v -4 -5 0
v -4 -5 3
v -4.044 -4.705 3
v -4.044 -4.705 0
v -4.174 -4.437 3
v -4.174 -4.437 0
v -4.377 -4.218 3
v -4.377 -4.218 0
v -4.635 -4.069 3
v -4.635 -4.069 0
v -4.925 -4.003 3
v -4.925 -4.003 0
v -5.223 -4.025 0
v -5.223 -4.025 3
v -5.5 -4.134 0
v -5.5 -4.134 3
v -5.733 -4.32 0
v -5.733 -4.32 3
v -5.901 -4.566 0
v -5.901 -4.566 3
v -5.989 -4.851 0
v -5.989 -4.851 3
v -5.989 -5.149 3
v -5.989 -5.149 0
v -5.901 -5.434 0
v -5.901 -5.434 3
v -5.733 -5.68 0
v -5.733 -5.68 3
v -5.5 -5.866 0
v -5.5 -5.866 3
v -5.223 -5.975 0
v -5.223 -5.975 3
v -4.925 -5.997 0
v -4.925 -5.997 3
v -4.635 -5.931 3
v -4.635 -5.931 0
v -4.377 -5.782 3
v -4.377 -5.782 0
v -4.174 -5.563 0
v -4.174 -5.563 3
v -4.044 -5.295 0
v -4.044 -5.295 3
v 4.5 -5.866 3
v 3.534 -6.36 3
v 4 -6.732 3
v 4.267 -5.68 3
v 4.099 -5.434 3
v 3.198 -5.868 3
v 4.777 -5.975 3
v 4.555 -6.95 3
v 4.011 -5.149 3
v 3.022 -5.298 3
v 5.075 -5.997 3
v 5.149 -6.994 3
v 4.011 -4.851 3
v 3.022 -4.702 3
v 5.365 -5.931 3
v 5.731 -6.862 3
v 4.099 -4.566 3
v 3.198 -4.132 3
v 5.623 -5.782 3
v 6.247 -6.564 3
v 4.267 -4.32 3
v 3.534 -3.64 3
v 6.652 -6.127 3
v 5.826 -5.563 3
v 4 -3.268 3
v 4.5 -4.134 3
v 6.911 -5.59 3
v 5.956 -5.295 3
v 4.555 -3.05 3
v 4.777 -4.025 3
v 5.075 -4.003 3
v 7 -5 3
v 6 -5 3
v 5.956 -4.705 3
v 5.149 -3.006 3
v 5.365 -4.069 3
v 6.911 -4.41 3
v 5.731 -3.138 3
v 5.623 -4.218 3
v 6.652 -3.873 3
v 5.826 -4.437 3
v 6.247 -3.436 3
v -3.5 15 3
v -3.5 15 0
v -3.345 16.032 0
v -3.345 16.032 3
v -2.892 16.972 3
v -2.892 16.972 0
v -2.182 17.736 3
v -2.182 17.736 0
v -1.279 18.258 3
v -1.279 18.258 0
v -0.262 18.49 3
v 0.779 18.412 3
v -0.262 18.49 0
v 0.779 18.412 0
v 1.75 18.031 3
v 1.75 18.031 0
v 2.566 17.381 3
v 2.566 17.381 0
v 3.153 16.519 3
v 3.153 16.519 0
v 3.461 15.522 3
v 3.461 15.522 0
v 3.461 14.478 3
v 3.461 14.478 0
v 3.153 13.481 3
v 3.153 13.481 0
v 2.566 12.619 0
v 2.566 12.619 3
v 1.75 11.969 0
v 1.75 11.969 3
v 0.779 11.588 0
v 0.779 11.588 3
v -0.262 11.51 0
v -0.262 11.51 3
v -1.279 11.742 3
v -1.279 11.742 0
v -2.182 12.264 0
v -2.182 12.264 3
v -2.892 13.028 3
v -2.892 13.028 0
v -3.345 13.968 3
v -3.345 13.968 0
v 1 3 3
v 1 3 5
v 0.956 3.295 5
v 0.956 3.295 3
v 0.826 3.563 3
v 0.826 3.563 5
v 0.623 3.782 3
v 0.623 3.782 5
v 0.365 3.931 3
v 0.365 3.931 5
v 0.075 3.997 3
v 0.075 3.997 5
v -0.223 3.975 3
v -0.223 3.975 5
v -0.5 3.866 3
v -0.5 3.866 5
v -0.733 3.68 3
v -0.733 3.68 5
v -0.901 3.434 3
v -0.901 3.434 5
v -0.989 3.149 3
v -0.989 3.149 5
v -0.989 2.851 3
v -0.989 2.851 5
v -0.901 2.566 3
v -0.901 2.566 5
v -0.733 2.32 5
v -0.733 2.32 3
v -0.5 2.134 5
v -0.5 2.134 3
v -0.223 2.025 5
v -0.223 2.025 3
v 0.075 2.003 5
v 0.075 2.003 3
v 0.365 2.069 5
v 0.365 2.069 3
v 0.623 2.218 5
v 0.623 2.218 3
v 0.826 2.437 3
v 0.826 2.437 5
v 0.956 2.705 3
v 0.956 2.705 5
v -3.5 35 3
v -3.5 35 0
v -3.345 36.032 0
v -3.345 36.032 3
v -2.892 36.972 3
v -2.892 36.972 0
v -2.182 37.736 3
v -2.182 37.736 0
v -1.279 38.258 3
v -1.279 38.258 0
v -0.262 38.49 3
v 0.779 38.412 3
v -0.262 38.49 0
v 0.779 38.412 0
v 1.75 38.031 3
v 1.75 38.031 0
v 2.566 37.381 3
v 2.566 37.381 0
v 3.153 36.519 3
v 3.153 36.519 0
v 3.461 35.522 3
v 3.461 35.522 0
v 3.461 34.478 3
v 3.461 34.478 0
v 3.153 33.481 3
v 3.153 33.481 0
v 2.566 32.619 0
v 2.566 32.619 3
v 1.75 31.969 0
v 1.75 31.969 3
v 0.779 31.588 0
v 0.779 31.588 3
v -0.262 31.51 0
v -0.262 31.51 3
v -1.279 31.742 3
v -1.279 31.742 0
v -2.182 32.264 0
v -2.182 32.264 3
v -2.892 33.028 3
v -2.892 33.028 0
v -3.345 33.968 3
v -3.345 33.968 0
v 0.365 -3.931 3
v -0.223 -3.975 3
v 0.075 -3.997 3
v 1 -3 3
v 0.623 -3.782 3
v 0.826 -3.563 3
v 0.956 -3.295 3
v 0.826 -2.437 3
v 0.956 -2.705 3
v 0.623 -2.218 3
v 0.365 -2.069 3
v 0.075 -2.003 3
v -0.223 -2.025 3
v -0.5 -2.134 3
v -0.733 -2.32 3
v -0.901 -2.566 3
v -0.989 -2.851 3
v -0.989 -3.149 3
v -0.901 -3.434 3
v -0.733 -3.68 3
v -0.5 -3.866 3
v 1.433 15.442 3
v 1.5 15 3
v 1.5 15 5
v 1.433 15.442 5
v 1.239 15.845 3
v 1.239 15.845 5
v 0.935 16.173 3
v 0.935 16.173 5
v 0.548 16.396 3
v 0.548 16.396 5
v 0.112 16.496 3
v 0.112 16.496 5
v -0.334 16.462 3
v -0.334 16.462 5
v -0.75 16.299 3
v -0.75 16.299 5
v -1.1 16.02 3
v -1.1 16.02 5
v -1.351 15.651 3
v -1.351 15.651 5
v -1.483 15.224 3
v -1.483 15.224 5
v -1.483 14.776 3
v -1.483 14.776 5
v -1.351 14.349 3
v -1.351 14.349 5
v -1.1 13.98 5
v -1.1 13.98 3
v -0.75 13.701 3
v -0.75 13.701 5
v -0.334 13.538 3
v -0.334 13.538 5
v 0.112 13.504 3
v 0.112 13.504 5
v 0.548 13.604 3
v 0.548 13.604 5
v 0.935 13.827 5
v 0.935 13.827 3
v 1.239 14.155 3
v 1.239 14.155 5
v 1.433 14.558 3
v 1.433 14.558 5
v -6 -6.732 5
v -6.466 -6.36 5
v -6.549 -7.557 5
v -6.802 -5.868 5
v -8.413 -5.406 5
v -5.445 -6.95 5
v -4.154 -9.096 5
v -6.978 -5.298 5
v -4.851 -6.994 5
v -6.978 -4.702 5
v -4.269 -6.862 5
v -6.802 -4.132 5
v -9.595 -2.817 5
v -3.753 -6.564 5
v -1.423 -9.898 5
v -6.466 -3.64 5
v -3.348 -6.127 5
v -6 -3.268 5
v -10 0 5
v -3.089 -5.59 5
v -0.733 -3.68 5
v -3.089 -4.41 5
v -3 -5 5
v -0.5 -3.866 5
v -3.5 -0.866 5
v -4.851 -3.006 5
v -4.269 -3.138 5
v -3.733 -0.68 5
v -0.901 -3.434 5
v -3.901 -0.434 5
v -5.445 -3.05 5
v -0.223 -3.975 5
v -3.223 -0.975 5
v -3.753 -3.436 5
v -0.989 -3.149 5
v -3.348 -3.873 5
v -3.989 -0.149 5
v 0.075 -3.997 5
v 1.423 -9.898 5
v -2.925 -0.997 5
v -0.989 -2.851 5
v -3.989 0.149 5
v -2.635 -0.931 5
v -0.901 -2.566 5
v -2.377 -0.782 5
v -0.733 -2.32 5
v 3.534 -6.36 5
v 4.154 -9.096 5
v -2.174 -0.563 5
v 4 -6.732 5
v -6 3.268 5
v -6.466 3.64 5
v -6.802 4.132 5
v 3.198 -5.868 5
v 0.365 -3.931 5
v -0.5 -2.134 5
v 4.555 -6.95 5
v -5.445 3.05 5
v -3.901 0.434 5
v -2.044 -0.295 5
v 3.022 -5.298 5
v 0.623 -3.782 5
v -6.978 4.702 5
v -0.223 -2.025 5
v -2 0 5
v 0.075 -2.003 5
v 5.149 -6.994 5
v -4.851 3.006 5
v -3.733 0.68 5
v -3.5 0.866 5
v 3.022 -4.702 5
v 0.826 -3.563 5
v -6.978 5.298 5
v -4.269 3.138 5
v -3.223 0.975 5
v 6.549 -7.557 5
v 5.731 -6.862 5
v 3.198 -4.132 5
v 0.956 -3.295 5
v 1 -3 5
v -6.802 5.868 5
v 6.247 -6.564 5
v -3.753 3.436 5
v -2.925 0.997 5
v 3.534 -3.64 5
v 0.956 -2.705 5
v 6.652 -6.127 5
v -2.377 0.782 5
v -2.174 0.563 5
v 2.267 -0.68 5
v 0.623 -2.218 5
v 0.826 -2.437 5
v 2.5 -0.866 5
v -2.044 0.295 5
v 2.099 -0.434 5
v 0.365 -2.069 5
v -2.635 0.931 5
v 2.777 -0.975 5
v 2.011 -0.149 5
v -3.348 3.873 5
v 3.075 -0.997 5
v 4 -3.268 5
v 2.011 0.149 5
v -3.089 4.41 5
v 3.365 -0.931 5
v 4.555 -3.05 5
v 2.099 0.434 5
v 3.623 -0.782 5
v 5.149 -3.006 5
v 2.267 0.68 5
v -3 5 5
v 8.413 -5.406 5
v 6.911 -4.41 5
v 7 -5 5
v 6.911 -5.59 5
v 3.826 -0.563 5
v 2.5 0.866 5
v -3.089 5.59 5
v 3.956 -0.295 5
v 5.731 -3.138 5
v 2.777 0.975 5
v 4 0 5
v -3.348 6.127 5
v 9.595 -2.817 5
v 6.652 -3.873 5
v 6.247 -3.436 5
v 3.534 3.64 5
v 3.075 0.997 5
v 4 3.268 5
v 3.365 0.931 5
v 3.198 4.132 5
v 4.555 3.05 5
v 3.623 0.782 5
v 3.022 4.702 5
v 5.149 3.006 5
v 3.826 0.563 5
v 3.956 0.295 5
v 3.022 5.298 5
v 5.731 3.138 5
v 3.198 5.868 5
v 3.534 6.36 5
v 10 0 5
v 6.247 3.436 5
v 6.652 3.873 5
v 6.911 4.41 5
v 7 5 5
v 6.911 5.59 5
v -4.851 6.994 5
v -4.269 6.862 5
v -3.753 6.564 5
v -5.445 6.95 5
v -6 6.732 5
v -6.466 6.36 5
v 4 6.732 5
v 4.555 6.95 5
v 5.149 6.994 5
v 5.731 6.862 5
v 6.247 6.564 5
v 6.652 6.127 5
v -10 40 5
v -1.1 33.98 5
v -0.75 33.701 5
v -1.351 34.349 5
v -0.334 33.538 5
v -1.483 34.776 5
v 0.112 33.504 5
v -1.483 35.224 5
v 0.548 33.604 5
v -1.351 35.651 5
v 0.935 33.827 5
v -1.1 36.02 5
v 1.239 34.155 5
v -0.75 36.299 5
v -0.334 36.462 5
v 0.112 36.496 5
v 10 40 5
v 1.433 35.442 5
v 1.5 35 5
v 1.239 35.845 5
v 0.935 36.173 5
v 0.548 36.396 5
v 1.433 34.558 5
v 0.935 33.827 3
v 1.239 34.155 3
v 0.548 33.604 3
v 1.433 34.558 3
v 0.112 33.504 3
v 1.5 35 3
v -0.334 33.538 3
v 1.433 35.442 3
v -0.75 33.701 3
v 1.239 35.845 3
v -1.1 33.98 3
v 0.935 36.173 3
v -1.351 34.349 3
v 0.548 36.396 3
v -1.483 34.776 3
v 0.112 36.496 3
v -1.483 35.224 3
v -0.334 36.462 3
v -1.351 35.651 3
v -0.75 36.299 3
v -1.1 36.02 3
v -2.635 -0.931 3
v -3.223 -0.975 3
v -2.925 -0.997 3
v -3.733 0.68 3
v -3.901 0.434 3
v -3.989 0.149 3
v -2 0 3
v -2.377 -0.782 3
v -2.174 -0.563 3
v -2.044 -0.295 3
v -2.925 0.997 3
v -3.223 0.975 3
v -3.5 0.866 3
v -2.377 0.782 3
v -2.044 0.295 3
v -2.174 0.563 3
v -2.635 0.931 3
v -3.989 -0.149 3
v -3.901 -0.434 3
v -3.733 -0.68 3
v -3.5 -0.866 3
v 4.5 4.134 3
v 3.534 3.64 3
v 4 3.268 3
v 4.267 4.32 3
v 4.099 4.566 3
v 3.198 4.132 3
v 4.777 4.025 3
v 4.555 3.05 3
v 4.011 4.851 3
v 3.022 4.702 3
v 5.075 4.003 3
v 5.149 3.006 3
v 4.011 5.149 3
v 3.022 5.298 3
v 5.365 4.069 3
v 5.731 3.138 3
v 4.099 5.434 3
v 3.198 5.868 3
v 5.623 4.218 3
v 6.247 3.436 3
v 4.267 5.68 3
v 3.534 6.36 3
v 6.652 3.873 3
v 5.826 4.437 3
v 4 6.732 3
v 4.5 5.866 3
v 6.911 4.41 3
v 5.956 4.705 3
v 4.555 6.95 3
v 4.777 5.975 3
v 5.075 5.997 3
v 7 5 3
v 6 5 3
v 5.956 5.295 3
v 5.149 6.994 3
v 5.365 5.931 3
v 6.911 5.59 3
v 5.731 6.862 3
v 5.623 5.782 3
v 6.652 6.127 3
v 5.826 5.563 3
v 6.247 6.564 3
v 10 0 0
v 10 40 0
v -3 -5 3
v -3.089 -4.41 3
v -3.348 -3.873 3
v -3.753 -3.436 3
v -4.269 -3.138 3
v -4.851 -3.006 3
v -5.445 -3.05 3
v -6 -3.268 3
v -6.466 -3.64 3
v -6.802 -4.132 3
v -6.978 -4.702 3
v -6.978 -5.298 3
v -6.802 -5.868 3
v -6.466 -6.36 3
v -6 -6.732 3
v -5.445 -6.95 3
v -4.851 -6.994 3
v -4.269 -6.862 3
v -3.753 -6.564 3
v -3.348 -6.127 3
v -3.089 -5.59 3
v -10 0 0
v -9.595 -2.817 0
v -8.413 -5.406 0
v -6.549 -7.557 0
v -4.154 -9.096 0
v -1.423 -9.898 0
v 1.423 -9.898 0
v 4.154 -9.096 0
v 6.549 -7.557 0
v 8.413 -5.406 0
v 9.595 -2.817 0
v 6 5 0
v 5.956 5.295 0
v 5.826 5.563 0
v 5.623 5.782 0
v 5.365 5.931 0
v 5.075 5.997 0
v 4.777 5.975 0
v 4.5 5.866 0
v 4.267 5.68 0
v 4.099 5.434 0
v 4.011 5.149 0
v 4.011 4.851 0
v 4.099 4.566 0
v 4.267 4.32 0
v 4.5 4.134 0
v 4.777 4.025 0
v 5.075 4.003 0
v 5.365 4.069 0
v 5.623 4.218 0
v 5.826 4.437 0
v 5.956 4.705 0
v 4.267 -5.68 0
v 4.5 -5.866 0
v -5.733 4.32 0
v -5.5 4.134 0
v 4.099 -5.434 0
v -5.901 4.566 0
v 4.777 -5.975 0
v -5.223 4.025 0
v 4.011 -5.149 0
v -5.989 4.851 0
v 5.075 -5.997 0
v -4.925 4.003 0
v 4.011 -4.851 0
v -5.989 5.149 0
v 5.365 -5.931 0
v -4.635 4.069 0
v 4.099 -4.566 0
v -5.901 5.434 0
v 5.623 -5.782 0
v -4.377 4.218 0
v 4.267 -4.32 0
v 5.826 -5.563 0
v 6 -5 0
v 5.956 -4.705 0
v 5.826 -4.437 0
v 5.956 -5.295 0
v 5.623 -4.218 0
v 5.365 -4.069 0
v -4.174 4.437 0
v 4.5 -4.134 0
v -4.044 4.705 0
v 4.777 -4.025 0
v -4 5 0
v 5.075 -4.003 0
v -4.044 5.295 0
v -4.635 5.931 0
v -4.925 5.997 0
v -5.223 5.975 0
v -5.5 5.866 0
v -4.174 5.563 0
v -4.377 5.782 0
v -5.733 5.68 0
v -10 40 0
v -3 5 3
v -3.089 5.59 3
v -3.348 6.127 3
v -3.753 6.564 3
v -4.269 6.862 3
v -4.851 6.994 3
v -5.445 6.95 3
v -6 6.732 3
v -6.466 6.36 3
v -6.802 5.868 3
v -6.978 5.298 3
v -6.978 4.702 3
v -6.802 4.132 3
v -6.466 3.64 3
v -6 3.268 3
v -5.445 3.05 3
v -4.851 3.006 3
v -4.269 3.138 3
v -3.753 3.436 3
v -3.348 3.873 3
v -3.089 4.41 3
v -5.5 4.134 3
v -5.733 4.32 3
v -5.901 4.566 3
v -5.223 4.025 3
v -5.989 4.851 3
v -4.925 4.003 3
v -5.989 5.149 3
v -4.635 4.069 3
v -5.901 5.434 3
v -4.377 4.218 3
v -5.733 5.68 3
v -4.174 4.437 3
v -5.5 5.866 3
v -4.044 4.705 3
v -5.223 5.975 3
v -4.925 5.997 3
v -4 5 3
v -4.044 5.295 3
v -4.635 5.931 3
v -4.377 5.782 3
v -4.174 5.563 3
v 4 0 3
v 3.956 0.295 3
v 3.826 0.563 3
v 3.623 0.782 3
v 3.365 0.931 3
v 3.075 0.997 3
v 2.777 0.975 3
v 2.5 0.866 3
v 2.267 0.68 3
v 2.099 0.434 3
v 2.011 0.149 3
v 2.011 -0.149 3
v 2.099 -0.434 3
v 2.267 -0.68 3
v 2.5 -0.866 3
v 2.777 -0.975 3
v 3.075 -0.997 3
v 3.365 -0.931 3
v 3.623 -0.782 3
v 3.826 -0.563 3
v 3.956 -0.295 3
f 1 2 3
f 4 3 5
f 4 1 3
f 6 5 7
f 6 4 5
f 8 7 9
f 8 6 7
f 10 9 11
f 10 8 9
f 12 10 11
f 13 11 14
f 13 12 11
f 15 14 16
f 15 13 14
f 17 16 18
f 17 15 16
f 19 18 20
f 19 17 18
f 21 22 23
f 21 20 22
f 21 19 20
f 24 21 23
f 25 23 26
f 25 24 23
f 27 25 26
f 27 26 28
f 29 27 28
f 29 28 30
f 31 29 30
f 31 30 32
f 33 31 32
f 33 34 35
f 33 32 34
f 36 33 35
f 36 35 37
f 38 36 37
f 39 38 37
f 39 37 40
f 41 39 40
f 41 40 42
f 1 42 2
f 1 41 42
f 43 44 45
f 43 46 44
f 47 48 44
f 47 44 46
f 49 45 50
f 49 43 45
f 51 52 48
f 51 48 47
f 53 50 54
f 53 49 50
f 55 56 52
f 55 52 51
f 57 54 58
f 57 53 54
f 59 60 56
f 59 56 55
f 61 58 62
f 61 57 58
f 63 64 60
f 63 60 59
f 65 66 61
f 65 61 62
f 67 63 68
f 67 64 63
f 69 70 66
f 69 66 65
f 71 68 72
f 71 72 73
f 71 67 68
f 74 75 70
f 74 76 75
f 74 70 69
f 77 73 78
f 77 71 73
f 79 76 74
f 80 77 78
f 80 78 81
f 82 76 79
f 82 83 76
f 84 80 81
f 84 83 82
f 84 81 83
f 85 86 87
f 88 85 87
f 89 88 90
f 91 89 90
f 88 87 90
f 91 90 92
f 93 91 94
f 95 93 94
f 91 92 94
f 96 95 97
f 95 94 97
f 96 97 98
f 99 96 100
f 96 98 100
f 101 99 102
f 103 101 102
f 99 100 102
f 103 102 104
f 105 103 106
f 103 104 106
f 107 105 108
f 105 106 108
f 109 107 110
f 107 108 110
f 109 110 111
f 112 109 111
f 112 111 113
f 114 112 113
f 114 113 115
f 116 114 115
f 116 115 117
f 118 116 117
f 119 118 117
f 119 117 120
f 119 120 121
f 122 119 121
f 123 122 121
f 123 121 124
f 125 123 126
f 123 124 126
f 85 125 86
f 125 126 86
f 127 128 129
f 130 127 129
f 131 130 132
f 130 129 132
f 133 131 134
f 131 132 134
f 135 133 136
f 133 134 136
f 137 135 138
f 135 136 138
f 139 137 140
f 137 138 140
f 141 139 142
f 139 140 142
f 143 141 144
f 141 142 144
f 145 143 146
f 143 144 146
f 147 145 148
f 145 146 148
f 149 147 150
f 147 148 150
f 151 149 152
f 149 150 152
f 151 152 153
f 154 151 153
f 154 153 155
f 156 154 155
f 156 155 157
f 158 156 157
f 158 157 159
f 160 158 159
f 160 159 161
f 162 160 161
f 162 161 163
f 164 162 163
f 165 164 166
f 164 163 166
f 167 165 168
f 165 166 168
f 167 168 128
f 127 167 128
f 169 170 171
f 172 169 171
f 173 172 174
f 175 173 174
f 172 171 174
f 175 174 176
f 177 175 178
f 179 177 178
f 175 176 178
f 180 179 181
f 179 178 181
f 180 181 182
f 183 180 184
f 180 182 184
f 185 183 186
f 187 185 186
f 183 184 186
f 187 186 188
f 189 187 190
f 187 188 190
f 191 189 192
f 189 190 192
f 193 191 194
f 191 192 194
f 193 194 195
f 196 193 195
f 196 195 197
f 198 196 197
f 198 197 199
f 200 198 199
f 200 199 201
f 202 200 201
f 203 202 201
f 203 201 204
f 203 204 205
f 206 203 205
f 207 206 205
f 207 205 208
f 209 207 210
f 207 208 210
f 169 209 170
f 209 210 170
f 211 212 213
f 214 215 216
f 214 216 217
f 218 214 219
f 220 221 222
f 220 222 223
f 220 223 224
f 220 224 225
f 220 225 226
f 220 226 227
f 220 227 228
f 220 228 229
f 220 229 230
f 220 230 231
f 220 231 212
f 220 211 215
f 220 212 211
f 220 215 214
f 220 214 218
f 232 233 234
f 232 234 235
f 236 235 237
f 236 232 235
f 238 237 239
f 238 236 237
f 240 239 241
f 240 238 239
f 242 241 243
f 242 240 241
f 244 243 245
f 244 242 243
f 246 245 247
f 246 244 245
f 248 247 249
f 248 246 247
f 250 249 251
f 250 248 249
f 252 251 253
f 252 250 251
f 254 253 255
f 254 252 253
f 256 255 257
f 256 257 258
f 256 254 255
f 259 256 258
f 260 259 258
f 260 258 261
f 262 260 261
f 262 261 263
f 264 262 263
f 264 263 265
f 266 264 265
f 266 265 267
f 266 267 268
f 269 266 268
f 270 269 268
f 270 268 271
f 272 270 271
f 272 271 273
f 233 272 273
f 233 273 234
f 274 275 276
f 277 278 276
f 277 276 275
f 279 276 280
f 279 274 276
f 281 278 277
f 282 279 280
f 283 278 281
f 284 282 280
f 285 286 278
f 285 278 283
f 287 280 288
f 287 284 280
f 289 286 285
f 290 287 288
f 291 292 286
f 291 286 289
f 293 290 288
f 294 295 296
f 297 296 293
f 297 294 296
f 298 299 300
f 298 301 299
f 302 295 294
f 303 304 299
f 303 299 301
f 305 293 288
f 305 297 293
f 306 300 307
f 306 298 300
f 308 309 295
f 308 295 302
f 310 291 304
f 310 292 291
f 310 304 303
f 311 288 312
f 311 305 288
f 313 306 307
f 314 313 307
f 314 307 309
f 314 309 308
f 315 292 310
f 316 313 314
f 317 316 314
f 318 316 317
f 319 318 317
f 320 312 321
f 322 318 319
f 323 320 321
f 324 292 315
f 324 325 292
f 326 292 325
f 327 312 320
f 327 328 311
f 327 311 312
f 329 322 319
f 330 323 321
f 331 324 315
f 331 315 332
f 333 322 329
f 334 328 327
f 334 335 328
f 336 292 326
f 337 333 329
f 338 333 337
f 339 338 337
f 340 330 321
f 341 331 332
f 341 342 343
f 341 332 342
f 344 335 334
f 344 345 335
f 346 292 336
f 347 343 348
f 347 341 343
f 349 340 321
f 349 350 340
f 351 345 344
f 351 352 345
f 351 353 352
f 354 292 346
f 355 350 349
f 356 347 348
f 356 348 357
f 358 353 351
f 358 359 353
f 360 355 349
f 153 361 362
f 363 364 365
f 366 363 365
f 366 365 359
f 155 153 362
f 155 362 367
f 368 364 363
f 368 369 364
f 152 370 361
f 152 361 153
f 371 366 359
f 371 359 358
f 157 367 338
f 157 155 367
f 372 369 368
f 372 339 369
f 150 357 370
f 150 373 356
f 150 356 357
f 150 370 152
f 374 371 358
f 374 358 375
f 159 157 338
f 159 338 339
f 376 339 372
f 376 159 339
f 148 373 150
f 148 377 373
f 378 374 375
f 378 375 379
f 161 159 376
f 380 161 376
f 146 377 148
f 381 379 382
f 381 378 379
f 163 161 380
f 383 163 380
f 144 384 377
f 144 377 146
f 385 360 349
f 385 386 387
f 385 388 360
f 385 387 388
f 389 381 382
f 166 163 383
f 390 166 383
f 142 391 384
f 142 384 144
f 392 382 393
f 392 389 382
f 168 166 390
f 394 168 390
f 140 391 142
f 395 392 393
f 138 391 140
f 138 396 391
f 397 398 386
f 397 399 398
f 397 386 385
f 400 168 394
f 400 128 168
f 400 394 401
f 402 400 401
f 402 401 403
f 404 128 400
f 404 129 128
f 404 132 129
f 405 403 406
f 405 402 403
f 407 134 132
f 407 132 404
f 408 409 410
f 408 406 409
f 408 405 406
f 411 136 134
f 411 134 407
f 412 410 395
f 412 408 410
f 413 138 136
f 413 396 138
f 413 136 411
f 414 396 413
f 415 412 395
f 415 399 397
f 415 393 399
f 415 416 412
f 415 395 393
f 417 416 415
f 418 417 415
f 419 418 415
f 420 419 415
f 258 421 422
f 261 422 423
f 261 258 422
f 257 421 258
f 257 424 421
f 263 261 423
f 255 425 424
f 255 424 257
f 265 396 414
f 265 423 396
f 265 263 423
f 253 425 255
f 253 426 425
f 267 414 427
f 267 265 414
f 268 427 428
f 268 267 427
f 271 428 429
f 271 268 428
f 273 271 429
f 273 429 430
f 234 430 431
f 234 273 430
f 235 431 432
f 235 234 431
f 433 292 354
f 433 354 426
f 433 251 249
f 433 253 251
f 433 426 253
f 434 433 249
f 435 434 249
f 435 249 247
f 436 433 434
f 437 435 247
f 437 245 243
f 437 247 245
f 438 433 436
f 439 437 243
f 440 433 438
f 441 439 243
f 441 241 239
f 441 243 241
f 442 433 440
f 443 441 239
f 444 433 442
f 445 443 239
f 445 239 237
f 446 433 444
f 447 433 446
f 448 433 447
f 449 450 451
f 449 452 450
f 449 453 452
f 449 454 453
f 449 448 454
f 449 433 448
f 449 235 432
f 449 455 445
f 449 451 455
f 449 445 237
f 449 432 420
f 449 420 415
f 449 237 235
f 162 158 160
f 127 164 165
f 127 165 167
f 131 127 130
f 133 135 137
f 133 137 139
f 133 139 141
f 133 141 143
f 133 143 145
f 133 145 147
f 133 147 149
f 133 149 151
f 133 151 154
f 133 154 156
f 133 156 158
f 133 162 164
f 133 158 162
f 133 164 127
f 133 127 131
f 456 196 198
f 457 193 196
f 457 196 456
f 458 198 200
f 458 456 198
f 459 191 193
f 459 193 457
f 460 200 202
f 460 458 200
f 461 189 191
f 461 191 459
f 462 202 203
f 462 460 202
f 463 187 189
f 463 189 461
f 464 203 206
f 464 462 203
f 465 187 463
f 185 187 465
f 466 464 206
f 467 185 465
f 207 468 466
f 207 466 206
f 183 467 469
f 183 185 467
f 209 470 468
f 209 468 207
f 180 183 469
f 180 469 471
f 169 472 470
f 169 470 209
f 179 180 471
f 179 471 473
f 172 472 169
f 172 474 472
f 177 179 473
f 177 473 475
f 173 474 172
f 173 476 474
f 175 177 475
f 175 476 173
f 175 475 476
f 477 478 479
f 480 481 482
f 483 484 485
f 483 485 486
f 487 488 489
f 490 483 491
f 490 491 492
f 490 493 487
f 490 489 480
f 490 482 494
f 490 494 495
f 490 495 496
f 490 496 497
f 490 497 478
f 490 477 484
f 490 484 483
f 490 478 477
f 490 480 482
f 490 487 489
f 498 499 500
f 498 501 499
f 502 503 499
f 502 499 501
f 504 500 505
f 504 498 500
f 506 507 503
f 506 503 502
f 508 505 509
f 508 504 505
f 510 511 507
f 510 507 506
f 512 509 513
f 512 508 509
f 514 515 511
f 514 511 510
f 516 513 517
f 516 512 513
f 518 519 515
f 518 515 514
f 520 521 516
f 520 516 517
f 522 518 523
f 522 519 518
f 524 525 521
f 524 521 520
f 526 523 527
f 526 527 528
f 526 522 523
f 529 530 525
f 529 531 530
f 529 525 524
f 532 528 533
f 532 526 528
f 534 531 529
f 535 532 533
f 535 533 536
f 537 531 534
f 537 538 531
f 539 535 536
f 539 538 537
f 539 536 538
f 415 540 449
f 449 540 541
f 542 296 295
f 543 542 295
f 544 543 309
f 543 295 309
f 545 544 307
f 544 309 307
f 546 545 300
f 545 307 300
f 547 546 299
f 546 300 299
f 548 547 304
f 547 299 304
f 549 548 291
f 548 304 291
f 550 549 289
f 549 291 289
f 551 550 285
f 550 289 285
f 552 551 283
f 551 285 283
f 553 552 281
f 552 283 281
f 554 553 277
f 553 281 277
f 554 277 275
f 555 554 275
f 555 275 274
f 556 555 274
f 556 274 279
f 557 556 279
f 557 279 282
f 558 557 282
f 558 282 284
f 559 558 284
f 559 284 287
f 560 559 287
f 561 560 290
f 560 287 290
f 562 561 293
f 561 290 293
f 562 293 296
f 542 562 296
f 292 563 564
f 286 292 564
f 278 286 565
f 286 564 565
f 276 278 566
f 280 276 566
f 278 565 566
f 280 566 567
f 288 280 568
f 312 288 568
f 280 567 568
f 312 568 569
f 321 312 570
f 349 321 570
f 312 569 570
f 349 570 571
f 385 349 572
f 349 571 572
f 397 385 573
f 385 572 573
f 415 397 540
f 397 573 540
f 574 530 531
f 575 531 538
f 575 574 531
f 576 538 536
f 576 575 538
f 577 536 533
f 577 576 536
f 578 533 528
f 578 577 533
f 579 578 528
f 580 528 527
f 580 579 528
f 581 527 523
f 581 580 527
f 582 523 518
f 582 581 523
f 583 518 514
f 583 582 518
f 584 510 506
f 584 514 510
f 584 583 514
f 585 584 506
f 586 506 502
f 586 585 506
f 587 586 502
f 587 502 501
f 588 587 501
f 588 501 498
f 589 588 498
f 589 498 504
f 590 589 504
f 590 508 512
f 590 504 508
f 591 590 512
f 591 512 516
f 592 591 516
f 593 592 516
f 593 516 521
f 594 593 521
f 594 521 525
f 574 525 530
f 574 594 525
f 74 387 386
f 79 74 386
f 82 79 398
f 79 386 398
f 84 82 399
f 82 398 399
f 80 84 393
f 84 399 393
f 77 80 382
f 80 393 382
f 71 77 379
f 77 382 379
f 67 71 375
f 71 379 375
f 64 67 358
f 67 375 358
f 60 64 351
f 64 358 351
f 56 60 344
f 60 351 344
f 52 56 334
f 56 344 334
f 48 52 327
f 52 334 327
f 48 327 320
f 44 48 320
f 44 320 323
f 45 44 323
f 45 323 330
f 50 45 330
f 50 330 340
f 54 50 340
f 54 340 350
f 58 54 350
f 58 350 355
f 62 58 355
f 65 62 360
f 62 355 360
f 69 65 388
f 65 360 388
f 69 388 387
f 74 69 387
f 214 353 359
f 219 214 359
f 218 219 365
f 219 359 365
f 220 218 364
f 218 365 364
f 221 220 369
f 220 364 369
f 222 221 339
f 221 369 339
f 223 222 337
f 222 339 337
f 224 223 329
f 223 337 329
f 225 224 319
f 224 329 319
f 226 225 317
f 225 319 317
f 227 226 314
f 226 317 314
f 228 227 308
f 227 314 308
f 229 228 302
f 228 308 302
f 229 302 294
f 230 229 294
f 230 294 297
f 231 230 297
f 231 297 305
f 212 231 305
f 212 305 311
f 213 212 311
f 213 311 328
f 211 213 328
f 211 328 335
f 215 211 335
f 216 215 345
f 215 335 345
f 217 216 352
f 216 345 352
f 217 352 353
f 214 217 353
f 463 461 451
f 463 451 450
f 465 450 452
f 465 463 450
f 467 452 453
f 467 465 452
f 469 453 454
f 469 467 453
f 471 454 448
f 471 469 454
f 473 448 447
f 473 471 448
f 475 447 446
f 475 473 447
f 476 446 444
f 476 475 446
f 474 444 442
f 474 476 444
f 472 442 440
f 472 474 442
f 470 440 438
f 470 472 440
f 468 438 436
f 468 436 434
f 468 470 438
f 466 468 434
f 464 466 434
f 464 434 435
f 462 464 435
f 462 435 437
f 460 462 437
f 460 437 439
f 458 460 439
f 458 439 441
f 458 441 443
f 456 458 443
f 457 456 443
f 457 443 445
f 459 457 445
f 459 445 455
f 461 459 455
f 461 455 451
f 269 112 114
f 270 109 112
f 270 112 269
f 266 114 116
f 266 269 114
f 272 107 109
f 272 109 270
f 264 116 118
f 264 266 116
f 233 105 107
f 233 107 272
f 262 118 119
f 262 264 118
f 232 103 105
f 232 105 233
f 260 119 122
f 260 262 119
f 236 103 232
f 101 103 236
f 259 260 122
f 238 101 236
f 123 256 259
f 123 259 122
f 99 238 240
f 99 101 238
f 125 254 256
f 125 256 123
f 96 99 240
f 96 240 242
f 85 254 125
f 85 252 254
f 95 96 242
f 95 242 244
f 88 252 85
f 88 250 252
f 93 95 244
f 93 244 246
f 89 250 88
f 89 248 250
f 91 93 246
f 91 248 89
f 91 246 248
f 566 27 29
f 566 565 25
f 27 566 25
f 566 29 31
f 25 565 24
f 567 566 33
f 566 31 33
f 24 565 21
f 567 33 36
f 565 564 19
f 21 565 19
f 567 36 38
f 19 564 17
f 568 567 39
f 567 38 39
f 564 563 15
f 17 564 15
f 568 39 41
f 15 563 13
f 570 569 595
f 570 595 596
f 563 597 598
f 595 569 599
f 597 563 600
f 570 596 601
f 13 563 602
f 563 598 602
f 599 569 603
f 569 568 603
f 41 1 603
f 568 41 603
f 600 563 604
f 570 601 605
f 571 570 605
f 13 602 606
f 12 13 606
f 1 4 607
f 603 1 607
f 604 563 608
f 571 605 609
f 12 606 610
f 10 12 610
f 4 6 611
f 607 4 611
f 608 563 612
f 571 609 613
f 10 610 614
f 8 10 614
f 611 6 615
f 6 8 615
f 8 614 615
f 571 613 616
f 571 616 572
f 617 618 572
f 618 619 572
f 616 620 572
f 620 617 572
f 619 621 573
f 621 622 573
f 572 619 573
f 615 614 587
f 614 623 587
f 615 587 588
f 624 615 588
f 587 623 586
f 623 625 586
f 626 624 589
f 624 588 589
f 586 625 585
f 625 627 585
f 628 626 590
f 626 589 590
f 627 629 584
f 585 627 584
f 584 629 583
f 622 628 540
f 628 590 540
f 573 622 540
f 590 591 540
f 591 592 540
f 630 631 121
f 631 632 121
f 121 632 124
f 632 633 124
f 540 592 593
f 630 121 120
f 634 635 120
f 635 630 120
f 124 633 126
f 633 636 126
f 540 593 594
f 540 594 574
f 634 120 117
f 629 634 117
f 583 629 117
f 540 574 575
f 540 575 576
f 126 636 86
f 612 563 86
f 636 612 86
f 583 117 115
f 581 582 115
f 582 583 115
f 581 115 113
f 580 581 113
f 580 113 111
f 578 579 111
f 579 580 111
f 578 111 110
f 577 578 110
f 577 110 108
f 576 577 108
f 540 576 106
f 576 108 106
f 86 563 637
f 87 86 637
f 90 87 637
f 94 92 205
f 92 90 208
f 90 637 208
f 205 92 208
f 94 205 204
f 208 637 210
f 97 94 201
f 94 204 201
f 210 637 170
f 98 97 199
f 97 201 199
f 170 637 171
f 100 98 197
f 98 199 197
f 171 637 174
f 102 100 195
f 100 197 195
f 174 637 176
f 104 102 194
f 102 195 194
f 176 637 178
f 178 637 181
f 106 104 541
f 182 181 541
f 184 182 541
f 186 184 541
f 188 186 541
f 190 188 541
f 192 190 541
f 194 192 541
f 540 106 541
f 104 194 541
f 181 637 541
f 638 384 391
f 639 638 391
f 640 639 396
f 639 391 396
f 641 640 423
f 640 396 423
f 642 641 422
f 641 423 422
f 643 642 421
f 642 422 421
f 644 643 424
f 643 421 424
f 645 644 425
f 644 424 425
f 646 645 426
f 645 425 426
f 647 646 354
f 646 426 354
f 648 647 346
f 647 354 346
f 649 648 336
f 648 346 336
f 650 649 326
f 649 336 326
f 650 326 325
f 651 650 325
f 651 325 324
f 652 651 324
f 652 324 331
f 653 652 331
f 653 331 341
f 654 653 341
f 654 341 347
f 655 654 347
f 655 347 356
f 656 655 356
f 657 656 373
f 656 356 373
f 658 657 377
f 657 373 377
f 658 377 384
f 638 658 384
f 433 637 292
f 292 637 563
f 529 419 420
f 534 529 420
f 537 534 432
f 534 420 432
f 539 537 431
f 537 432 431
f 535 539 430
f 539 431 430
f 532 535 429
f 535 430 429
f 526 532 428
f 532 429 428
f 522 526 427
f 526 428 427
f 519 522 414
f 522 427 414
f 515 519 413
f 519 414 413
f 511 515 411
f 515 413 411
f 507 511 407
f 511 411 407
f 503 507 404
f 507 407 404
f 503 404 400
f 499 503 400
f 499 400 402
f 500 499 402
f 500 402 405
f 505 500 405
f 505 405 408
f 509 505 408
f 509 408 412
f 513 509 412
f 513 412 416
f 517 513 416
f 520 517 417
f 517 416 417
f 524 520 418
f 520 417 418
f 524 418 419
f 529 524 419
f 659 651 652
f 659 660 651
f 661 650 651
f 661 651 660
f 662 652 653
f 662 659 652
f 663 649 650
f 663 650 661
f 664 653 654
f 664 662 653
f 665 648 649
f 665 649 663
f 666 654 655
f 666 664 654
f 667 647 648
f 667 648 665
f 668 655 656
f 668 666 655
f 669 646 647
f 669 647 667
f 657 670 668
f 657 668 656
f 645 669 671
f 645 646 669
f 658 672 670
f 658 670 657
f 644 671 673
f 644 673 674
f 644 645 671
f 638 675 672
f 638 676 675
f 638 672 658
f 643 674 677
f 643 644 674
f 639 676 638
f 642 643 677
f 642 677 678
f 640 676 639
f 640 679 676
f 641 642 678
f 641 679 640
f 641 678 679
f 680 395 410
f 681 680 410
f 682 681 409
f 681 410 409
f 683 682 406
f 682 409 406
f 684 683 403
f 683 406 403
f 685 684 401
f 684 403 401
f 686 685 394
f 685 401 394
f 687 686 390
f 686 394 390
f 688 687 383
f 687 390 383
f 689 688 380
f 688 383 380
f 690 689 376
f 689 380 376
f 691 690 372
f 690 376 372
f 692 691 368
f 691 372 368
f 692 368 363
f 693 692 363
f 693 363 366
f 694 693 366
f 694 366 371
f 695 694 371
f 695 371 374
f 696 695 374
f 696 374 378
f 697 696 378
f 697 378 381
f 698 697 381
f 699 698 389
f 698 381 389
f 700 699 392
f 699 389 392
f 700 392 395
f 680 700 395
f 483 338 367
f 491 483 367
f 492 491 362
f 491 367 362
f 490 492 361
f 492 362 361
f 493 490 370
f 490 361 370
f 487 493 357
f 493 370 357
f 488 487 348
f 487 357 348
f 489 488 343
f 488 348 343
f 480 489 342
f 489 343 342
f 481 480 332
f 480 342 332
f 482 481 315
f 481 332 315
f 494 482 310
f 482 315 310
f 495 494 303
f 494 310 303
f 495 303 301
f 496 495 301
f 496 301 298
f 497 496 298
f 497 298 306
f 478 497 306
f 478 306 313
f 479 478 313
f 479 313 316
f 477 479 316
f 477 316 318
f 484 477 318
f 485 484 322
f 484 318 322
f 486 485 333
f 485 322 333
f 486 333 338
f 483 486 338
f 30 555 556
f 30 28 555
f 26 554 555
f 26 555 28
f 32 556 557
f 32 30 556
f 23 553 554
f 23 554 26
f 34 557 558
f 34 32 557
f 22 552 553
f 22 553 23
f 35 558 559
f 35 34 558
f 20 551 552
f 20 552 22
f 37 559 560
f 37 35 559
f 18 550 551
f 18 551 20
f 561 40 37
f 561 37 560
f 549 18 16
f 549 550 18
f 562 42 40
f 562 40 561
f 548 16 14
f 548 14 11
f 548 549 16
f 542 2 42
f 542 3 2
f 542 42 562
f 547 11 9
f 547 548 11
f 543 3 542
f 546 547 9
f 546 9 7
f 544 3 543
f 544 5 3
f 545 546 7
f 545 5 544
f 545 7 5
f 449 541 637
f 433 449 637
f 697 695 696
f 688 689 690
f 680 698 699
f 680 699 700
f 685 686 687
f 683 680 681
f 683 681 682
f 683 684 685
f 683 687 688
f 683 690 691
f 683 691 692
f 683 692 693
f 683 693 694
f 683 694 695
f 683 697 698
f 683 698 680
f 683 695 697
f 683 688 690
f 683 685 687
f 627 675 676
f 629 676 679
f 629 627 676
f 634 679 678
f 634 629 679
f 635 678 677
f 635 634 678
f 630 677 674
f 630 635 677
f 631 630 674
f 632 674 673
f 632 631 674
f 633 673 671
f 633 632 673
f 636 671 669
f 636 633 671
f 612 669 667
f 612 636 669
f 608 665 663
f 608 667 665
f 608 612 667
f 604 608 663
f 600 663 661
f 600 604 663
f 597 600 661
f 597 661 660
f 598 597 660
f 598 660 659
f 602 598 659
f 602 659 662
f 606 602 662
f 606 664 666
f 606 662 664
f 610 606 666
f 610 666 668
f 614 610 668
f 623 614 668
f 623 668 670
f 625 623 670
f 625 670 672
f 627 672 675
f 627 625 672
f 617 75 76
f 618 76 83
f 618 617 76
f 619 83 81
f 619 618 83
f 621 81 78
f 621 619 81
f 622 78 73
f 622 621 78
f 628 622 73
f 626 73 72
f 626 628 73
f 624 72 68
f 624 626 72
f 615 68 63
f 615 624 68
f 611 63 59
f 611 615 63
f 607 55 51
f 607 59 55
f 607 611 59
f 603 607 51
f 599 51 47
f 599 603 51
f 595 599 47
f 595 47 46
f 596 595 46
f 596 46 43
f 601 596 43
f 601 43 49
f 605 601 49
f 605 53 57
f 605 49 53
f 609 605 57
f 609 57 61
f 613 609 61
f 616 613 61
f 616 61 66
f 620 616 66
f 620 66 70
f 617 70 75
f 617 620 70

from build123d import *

# Parameters (mm, degrees)
SKETCH2_R           = 10
SKETCH2_R_2         = 1
SKETCH2_R_3         = 1.5
BOSS_EXTRUDE1_DEPTH = 5
SKETCH5_R           = 2
SKETCH5_R_2         = 1
CUT_EXTRUDE2_DEPTH  = 2
SKETCH6_R           = 3.5
CUT_EXTRUDE3_DEPTH  = 3


with BuildPart() as part:
    # Sketch2 → Boss-Extrude1 (new body)
    # profile 1 of 2: a face of its own
    with BuildSketch(Plane.XY):
        Circle(SKETCH2_R)
        with Locations((5, -5)):
            Circle(SKETCH2_R_2, mode=Mode.SUBTRACT)
        with Locations((-5, -5)):
            Circle(SKETCH2_R_2, mode=Mode.SUBTRACT)
        with Locations((5, 5)):
            Circle(SKETCH2_R_2, mode=Mode.SUBTRACT)
        with Locations((-5, 5)):
            Circle(SKETCH2_R_2, mode=Mode.SUBTRACT)
    # profile 2 of 2: a face of its own
    with BuildSketch(Plane.XY):
        with BuildLine():
            Line((-10, 40), (-10, 0))
            ThreePointArc((-10, 0), (0, 10), (10, 0))
            Line((10, 0), (10, 40))
            Line((10, 40), (-10, 40))
        make_face()
        with Locations((0, 15)):
            Circle(SKETCH2_R_3, mode=Mode.SUBTRACT)
        with Locations((0, 35)):
            Circle(SKETCH2_R_3, mode=Mode.SUBTRACT)
    extrude(amount=BOSS_EXTRUDE1_DEPTH)

    # Sketch5 → Cut-Extrude2 (cut)
    with BuildSketch(Plane.XY.offset(5)):
        with Locations((-5, 5)):
            Circle(SKETCH5_R)
        with Locations((5, 5)):
            Circle(SKETCH5_R)
        with Locations((5, -5)):
            Circle(SKETCH5_R)
        with Locations((-5, -5)):
            Circle(SKETCH5_R)
        with Locations((0, 3)):
            Circle(SKETCH5_R_2)
        with Locations((-3, 0)):
            Circle(SKETCH5_R_2)
        with Locations((3, 0)):
            Circle(SKETCH5_R_2)
        with Locations((0, -3)):
            Circle(SKETCH5_R_2)
    extrude(amount=-CUT_EXTRUDE2_DEPTH, mode=Mode.SUBTRACT)

    # Sketch6 → Cut-Extrude3 (cut)
    with BuildSketch(Plane(origin=(0, 0, 0), x_dir=(-1, 0, 0), z_dir=(0, 0, -1))):
        with Locations((0, 35)):
            Circle(SKETCH6_R)
        with Locations((0, 15)):
            Circle(SKETCH6_R)
    extrude(amount=-CUT_EXTRUDE3_DEPTH, mode=Mode.SUBTRACT)


solid = part.part
